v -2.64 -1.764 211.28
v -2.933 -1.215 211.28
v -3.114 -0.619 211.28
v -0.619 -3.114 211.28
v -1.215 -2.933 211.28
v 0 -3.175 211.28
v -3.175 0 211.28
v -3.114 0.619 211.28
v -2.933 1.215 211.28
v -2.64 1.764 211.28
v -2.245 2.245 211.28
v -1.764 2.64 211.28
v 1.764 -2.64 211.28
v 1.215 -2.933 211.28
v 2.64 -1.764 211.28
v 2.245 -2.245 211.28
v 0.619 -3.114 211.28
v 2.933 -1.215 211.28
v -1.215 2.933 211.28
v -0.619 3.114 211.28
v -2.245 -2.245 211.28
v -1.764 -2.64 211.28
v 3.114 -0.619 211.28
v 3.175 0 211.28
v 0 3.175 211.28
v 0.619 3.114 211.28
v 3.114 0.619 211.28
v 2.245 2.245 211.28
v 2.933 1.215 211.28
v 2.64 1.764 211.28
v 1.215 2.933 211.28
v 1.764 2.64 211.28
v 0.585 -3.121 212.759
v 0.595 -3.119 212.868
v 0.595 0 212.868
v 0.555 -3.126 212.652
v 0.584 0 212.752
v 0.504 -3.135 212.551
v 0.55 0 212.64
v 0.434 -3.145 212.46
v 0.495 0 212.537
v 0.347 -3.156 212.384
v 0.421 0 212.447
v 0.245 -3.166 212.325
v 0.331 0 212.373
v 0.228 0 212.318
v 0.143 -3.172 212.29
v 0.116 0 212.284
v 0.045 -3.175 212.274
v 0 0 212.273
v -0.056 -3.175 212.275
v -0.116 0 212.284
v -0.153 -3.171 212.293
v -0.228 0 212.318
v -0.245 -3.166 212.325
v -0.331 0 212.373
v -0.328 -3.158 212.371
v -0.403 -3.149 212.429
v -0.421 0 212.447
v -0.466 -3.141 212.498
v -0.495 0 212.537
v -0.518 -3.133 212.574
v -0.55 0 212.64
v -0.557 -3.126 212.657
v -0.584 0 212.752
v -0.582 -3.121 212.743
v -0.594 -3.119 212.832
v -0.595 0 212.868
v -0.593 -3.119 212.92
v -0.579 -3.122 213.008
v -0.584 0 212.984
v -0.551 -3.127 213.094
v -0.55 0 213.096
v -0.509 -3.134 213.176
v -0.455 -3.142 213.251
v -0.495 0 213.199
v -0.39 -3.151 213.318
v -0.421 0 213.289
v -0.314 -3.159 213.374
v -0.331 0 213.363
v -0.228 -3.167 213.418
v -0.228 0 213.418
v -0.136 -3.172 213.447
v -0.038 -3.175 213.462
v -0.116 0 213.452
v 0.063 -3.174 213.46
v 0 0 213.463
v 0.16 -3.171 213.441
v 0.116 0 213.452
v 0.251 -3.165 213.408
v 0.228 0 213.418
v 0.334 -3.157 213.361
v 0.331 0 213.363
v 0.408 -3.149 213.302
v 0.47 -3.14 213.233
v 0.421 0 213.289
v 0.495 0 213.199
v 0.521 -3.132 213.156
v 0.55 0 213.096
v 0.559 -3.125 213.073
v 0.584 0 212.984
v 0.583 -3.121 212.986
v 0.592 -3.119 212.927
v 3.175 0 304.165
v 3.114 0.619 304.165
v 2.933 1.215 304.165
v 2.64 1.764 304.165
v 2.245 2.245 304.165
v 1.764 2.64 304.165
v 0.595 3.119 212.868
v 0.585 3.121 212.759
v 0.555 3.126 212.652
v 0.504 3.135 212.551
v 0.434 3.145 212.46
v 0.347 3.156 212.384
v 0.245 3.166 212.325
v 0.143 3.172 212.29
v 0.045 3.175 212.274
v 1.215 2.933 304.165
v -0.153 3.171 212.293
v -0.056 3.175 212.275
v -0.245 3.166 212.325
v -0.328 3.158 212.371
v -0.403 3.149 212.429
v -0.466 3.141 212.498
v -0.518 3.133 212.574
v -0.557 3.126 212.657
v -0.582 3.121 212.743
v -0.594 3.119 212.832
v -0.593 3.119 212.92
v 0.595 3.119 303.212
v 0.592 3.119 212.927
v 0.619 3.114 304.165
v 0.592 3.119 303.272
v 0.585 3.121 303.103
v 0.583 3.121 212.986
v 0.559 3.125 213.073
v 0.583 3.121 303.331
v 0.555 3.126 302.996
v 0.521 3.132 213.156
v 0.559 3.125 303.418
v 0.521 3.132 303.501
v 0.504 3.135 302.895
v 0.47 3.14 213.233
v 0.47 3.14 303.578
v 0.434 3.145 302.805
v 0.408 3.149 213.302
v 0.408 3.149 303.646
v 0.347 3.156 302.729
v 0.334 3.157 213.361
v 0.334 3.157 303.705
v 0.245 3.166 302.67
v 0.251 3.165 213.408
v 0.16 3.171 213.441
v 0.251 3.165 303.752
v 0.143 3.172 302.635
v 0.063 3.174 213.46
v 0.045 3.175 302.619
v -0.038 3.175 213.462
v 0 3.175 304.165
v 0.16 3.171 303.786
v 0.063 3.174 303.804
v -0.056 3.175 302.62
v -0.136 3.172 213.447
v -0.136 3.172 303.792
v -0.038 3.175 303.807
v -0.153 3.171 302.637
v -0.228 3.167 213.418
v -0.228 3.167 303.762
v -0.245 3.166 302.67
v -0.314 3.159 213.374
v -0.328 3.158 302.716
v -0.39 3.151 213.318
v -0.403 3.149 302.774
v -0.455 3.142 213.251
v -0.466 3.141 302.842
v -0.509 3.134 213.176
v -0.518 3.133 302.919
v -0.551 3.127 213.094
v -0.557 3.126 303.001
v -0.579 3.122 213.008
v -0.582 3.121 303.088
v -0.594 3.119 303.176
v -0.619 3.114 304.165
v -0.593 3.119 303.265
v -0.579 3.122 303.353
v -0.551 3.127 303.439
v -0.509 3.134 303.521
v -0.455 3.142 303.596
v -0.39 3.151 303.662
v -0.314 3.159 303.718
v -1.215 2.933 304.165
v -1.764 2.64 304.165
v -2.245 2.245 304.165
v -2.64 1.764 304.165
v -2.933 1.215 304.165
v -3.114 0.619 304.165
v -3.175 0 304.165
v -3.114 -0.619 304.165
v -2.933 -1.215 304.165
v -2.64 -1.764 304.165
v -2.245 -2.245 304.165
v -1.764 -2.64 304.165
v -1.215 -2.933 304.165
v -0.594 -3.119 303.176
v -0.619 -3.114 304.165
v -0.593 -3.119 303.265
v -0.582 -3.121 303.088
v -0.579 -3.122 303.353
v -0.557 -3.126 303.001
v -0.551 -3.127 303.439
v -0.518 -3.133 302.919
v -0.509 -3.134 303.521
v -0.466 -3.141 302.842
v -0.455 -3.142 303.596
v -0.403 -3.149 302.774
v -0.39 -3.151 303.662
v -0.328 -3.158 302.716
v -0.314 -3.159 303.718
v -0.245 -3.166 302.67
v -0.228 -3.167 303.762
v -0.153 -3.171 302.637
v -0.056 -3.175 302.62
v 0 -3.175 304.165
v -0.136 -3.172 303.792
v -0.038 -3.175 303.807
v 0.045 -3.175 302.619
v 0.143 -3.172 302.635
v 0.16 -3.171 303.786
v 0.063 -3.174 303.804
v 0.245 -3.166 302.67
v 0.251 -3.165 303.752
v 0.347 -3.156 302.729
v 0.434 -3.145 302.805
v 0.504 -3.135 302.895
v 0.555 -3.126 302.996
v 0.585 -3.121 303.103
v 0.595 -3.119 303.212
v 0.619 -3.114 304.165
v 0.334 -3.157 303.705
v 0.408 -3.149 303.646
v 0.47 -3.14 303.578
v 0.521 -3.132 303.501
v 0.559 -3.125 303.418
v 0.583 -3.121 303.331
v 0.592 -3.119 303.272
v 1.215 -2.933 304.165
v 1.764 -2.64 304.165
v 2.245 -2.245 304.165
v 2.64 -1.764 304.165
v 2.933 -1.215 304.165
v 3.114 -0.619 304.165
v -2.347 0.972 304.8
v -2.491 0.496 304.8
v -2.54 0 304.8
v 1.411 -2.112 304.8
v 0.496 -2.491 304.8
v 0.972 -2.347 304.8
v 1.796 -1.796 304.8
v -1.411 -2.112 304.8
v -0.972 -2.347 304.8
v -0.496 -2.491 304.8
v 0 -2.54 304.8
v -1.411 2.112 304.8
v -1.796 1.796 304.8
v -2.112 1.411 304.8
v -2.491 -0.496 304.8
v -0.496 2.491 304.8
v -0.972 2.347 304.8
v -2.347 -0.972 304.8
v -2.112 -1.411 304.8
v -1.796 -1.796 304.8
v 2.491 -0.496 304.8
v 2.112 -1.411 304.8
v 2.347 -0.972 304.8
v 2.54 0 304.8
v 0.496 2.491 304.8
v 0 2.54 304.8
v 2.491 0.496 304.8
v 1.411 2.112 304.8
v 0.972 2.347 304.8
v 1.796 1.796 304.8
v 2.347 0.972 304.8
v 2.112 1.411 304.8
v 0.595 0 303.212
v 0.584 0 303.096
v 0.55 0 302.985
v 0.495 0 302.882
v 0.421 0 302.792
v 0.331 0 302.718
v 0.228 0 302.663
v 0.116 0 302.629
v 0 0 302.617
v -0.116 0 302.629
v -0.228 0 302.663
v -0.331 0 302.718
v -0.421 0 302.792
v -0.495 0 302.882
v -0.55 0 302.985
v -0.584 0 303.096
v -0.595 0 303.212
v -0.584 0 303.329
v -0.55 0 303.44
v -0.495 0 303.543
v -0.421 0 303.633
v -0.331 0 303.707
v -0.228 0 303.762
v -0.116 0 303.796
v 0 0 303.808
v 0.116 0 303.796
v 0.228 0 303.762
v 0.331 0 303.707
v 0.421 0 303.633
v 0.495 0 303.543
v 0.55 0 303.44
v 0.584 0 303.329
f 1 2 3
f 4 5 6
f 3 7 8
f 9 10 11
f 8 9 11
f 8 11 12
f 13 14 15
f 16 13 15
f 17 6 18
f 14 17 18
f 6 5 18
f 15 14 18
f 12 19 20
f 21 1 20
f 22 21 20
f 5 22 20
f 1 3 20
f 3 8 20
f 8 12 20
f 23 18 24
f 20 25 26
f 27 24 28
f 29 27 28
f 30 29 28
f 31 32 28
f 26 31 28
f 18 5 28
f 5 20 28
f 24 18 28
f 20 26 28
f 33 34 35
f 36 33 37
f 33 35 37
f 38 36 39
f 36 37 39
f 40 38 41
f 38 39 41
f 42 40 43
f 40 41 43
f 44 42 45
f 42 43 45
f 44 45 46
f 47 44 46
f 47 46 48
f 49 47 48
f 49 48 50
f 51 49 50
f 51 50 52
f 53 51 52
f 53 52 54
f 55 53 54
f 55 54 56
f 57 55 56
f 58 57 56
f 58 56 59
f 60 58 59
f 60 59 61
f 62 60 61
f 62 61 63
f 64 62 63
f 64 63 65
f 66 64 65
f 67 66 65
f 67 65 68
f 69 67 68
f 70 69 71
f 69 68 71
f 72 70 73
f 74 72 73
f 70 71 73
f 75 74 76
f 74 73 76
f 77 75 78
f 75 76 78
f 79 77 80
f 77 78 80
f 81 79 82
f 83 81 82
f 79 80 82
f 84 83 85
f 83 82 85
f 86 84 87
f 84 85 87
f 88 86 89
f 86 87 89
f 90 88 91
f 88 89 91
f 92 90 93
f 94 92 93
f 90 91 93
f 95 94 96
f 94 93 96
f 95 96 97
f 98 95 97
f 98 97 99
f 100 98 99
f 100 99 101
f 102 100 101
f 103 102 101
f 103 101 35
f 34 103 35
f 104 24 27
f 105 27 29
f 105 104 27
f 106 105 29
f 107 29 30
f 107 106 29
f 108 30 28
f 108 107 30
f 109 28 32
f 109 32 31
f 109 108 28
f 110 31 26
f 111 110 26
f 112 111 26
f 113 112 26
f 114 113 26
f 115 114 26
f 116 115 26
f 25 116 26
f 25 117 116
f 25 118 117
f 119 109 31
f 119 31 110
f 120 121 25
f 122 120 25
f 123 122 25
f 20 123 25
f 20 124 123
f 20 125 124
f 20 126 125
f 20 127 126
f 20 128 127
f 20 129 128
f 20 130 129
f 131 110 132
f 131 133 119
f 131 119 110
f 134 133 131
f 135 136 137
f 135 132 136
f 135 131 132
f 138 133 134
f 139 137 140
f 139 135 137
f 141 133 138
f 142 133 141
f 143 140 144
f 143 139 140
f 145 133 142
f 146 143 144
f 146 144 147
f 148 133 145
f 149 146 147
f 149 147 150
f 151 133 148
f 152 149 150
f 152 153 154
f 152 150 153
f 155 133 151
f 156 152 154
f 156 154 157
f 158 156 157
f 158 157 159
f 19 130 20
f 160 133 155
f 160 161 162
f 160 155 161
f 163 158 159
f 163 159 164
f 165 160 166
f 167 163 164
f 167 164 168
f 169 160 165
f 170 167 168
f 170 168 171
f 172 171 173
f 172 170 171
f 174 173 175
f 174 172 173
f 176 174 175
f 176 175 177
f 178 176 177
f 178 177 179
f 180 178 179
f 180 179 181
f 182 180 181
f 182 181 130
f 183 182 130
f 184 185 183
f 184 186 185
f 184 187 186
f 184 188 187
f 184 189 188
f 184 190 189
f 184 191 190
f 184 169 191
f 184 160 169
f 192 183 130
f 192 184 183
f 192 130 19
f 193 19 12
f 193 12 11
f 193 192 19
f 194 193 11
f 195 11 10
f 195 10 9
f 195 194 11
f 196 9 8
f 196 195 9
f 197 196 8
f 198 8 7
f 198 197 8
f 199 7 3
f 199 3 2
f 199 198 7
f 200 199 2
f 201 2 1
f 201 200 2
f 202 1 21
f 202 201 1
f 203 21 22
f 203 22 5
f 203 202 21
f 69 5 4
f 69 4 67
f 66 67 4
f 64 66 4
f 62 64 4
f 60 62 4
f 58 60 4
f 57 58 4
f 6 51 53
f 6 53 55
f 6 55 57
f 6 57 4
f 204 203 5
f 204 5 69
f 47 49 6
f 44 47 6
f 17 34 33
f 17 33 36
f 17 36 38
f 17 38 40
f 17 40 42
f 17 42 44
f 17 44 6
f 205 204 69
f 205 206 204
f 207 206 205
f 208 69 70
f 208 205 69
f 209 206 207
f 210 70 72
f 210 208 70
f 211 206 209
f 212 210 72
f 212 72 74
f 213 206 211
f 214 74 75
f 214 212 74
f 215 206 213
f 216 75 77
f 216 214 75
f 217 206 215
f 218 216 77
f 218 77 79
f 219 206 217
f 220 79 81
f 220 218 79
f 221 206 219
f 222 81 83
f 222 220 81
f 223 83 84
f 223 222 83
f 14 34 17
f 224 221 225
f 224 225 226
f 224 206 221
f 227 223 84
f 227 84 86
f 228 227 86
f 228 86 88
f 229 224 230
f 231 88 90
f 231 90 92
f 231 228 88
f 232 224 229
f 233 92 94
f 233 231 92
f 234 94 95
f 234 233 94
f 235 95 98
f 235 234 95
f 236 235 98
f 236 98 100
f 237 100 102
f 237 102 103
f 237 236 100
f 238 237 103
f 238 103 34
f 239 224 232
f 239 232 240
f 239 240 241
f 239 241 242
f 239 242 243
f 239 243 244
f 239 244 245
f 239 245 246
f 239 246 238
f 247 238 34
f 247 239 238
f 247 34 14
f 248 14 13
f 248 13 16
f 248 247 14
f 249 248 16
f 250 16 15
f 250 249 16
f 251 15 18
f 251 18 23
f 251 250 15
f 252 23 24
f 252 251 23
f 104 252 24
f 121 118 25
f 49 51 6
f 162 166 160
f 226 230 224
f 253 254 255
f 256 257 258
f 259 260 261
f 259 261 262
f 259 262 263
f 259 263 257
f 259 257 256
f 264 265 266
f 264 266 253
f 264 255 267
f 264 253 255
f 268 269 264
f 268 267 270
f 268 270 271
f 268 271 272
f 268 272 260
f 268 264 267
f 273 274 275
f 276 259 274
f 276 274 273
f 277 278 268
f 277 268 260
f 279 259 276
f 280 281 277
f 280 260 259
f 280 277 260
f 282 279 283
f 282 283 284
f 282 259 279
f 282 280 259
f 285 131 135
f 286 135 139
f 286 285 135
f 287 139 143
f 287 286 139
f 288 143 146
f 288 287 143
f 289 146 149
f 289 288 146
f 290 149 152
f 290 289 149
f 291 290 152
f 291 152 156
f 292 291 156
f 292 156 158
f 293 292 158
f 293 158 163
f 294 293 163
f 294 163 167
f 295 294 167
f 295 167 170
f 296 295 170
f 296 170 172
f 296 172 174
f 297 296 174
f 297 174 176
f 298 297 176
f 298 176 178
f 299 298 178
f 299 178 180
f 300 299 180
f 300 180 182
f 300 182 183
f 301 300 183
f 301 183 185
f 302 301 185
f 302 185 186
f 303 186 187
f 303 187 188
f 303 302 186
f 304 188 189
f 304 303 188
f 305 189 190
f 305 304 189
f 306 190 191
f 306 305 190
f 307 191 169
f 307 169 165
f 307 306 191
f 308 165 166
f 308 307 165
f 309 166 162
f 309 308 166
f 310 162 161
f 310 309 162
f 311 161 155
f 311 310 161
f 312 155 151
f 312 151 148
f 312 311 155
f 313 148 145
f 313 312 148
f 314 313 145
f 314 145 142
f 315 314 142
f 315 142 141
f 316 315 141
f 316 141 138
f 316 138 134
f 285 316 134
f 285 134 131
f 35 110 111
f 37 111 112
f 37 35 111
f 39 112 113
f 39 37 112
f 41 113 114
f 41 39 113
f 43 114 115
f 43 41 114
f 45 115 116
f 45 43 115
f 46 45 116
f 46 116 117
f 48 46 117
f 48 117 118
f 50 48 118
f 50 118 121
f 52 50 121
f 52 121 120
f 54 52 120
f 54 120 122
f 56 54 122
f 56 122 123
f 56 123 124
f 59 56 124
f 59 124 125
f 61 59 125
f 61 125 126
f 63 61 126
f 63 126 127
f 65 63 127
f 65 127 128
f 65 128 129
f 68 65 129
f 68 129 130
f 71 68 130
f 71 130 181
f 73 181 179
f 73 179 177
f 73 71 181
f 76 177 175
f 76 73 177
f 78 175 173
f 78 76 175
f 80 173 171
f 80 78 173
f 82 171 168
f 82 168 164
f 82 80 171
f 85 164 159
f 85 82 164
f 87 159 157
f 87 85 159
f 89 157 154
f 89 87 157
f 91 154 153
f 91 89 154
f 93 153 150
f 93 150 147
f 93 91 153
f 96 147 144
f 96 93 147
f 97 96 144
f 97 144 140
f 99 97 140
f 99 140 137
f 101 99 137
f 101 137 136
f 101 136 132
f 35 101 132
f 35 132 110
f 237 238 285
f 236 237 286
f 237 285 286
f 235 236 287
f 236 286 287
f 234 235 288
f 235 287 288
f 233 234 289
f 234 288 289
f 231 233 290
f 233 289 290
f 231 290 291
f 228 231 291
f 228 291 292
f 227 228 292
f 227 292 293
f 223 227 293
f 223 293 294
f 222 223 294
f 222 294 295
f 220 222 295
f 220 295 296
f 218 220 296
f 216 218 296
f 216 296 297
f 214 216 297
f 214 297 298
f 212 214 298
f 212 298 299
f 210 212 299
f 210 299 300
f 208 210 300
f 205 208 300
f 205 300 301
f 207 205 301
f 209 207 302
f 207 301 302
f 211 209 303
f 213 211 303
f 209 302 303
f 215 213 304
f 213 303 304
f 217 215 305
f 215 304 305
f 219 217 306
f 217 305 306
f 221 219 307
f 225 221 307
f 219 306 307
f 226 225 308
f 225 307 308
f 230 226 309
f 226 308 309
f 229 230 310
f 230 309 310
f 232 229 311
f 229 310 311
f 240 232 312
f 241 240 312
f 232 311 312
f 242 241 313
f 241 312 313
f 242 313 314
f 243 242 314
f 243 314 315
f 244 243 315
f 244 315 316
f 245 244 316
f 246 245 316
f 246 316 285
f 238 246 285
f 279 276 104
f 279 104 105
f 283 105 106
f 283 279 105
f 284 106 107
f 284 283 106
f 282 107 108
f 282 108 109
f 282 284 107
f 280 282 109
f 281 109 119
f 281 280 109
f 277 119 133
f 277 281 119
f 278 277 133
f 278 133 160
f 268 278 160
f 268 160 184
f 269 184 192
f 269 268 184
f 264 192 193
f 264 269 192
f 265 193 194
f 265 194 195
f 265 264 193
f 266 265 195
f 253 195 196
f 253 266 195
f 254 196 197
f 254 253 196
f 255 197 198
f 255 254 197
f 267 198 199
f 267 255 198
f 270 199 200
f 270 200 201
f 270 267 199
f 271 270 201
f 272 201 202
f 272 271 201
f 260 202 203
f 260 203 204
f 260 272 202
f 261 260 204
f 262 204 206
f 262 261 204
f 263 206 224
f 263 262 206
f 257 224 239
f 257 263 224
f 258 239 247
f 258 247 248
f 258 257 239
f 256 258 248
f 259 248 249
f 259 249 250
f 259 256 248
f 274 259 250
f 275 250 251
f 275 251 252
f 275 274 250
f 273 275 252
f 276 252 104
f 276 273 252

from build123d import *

# Parameters (mm, degrees)
SKETCH3_R               = 3.175
BOSS_EXTRUDE1_DEPTH     = 304.8
CHAMFER1_SIZE           = 0.635
CUT_EXTRUDE1_START      = -93.519625
SKETCH4_R               = 3.175
CUT_EXTRUDE1_DEPTH      = 517.080375
SKETCH5_R               = 0.5953125
CUT_EXTRUDE2_DEPTH      = 4.175
CUT_EXTRUDE2_DEPTH_BACK = 4.175


with BuildPart() as part:
    # Sketch3 → Boss-Extrude1 (new body, symmetric)
    with BuildSketch(Plane.XY):
        Circle(SKETCH3_R)
    extrude(amount=BOSS_EXTRUDE1_DEPTH, both=True)

    # Chamfer1
    chamfer1_edges = [part.edges().sort_by_distance(p)[0] for p in [
        (-3.175, 0, -304.8),
        (-3.175, 0, 304.8),
    ]]
    chamfer(chamfer1_edges, length=CHAMFER1_SIZE)

    # Sketch4 → Cut-Extrude1 (cut, through all)
    with BuildSketch(Plane.XY.offset(304.8).offset(CUT_EXTRUDE1_START)):
        Circle(SKETCH4_R)
    extrude(amount=-CUT_EXTRUDE1_DEPTH, mode=Mode.SUBTRACT)

    # Sketch5 → Cut-Extrude2 (cut, two sides)
    with BuildSketch(Plane(origin=(0, 0, 0), x_dir=(1, 0, 0), z_dir=(0, 1, 0))) as cut_extrude2_sk:
        with Locations((0, -212.867875)):
            Circle(SKETCH5_R)
        with Locations((0, -303.2125)):
            Circle(SKETCH5_R)
    extrude(amount=CUT_EXTRUDE2_DEPTH, mode=Mode.SUBTRACT)
    extrude(cut_extrude2_sk.sketch, amount=-CUT_EXTRUDE2_DEPTH_BACK, mode=Mode.SUBTRACT)


solid = part.part
